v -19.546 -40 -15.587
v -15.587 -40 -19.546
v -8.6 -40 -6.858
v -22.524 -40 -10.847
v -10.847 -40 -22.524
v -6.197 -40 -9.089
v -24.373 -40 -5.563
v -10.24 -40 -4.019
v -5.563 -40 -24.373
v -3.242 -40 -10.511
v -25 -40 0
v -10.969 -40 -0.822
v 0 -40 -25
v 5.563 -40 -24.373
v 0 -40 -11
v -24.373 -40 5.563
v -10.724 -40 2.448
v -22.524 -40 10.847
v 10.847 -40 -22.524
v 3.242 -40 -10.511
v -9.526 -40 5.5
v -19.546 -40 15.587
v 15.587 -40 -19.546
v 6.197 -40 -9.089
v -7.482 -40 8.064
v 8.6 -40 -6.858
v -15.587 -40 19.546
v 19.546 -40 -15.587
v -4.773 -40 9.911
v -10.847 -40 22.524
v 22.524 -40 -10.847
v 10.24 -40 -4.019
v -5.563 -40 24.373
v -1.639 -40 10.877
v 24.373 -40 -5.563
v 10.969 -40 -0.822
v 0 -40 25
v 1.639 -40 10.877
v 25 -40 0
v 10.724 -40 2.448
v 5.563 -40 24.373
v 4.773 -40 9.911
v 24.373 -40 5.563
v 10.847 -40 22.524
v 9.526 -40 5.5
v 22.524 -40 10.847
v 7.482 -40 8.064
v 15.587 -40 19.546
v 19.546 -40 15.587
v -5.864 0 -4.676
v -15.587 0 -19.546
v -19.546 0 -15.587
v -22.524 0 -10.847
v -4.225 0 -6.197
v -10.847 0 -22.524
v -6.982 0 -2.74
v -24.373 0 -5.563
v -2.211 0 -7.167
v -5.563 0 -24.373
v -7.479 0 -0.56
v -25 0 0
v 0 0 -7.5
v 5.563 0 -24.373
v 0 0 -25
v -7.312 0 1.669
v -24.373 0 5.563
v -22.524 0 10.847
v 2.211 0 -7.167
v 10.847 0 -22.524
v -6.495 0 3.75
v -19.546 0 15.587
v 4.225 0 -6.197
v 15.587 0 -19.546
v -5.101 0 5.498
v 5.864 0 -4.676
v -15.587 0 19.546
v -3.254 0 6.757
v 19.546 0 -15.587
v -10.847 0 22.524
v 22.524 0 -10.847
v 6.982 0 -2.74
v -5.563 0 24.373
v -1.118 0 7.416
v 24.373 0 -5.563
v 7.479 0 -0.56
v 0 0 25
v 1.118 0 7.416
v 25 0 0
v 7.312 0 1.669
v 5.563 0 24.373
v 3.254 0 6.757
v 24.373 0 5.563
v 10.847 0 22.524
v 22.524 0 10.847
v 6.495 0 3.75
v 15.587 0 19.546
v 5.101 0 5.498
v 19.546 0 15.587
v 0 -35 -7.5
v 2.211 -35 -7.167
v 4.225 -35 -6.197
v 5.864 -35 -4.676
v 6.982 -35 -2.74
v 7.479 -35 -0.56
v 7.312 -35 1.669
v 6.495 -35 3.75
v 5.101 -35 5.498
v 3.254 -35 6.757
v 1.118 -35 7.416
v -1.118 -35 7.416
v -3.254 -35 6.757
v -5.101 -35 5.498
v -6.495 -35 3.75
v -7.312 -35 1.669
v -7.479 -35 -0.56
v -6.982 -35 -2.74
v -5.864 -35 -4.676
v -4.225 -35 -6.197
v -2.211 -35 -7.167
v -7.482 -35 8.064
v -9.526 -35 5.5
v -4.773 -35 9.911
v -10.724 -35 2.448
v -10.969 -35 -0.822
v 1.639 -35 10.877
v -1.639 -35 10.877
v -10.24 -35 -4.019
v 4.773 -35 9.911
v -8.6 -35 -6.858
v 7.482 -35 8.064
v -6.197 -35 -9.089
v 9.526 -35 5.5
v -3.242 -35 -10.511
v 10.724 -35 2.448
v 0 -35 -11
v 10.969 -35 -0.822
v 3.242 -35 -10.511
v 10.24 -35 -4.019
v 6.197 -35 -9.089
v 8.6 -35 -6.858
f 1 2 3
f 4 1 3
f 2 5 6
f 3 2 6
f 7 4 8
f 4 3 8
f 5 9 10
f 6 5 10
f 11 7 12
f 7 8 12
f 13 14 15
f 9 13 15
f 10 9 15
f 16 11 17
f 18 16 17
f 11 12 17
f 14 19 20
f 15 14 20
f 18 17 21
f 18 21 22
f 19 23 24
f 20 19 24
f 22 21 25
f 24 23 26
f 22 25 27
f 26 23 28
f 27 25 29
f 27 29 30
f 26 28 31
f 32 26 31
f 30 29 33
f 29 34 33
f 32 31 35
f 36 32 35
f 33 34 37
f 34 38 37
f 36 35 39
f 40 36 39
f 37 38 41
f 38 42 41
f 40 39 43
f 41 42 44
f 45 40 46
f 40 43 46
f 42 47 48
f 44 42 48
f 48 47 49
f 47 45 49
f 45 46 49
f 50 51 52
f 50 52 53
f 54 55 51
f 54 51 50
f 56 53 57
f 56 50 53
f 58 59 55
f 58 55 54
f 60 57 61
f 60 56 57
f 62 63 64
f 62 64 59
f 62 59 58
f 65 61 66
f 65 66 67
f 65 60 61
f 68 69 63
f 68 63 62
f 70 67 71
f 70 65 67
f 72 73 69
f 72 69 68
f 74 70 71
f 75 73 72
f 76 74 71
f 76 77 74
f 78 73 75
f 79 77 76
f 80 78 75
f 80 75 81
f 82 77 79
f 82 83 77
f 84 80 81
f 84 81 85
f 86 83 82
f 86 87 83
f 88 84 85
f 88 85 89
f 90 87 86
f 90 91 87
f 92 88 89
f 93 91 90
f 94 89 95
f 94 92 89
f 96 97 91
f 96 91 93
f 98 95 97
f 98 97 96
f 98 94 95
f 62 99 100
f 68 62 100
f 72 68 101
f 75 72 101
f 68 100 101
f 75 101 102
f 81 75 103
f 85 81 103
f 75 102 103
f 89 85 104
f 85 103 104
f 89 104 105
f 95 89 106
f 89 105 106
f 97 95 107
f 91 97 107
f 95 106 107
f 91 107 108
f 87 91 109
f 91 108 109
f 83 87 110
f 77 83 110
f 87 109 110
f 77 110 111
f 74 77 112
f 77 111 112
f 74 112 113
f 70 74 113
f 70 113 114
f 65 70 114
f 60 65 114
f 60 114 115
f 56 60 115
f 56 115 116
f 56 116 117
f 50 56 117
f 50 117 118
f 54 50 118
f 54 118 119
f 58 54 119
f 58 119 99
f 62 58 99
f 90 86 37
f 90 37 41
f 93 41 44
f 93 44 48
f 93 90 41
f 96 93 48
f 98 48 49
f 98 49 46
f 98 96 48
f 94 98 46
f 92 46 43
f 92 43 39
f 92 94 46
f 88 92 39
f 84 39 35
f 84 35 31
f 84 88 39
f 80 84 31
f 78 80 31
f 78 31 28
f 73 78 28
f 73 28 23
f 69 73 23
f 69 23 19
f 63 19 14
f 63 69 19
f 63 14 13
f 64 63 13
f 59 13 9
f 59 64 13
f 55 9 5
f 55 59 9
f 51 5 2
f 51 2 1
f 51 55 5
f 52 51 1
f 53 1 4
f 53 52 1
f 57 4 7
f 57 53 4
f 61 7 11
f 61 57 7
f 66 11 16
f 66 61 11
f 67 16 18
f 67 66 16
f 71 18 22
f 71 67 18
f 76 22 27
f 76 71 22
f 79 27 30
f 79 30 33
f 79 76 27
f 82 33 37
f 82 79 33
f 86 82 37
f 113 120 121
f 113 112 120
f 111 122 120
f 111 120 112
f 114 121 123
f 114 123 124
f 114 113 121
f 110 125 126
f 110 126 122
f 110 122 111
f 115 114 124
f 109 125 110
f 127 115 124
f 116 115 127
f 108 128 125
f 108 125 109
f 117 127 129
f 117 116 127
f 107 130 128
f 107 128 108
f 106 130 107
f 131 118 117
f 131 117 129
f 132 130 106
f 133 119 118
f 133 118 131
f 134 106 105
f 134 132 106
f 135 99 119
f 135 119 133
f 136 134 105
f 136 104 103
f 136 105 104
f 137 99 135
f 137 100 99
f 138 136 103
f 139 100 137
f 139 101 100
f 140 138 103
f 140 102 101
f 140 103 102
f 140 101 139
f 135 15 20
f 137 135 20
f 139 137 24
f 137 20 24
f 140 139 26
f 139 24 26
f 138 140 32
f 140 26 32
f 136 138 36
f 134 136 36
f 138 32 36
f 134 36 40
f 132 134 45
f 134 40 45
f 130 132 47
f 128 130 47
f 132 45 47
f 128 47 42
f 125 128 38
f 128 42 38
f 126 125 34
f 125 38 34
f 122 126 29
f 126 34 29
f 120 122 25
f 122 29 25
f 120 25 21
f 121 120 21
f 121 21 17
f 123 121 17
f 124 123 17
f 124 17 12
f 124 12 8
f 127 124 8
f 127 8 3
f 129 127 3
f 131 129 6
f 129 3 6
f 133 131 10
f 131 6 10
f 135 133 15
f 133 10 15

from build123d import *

# Parameters (mm, degrees)
SKETCH1_R          = 25
BASE_FLANGE1_DEPTH = 40
SKETCH8_R          = 11
CUT_EXTRUDE2_DEPTH = 5
SKETCH9_R          = 7.5
CUT_EXTRUDE3_DEPTH = 50.749371855


# Sheet-metal steps are written as plain solids
with BuildPart() as part:
    # Sketch1 → Base-Flange1 (new body)
    with BuildSketch(Plane(origin=(0, 0, 0), x_dir=(1, 0, 0), z_dir=(0, 1, 0))):
        with Locations(Location((0, 0, 0), (0, 0, 270))):
            Circle(SKETCH1_R)
    extrude(amount=-BASE_FLANGE1_DEPTH)

    # Sketch8 → Cut-Extrude2 (cut)
    with BuildSketch(Plane.XZ.offset(40)):
        with Locations(Location((0, 0, 0), (0, 0, 270))):
            Circle(SKETCH8_R)
    extrude(amount=-CUT_EXTRUDE2_DEPTH, mode=Mode.SUBTRACT)

    # Sketch9 → Cut-Extrude3 (cut, through all)
    with BuildSketch(Plane.XZ.offset(35)):
        with Locations(Location((0, 0, 0), (0, 0, 270))):
            Circle(SKETCH9_R)
    extrude(amount=-CUT_EXTRUDE3_DEPTH, mode=Mode.SUBTRACT)


solid = part.part
